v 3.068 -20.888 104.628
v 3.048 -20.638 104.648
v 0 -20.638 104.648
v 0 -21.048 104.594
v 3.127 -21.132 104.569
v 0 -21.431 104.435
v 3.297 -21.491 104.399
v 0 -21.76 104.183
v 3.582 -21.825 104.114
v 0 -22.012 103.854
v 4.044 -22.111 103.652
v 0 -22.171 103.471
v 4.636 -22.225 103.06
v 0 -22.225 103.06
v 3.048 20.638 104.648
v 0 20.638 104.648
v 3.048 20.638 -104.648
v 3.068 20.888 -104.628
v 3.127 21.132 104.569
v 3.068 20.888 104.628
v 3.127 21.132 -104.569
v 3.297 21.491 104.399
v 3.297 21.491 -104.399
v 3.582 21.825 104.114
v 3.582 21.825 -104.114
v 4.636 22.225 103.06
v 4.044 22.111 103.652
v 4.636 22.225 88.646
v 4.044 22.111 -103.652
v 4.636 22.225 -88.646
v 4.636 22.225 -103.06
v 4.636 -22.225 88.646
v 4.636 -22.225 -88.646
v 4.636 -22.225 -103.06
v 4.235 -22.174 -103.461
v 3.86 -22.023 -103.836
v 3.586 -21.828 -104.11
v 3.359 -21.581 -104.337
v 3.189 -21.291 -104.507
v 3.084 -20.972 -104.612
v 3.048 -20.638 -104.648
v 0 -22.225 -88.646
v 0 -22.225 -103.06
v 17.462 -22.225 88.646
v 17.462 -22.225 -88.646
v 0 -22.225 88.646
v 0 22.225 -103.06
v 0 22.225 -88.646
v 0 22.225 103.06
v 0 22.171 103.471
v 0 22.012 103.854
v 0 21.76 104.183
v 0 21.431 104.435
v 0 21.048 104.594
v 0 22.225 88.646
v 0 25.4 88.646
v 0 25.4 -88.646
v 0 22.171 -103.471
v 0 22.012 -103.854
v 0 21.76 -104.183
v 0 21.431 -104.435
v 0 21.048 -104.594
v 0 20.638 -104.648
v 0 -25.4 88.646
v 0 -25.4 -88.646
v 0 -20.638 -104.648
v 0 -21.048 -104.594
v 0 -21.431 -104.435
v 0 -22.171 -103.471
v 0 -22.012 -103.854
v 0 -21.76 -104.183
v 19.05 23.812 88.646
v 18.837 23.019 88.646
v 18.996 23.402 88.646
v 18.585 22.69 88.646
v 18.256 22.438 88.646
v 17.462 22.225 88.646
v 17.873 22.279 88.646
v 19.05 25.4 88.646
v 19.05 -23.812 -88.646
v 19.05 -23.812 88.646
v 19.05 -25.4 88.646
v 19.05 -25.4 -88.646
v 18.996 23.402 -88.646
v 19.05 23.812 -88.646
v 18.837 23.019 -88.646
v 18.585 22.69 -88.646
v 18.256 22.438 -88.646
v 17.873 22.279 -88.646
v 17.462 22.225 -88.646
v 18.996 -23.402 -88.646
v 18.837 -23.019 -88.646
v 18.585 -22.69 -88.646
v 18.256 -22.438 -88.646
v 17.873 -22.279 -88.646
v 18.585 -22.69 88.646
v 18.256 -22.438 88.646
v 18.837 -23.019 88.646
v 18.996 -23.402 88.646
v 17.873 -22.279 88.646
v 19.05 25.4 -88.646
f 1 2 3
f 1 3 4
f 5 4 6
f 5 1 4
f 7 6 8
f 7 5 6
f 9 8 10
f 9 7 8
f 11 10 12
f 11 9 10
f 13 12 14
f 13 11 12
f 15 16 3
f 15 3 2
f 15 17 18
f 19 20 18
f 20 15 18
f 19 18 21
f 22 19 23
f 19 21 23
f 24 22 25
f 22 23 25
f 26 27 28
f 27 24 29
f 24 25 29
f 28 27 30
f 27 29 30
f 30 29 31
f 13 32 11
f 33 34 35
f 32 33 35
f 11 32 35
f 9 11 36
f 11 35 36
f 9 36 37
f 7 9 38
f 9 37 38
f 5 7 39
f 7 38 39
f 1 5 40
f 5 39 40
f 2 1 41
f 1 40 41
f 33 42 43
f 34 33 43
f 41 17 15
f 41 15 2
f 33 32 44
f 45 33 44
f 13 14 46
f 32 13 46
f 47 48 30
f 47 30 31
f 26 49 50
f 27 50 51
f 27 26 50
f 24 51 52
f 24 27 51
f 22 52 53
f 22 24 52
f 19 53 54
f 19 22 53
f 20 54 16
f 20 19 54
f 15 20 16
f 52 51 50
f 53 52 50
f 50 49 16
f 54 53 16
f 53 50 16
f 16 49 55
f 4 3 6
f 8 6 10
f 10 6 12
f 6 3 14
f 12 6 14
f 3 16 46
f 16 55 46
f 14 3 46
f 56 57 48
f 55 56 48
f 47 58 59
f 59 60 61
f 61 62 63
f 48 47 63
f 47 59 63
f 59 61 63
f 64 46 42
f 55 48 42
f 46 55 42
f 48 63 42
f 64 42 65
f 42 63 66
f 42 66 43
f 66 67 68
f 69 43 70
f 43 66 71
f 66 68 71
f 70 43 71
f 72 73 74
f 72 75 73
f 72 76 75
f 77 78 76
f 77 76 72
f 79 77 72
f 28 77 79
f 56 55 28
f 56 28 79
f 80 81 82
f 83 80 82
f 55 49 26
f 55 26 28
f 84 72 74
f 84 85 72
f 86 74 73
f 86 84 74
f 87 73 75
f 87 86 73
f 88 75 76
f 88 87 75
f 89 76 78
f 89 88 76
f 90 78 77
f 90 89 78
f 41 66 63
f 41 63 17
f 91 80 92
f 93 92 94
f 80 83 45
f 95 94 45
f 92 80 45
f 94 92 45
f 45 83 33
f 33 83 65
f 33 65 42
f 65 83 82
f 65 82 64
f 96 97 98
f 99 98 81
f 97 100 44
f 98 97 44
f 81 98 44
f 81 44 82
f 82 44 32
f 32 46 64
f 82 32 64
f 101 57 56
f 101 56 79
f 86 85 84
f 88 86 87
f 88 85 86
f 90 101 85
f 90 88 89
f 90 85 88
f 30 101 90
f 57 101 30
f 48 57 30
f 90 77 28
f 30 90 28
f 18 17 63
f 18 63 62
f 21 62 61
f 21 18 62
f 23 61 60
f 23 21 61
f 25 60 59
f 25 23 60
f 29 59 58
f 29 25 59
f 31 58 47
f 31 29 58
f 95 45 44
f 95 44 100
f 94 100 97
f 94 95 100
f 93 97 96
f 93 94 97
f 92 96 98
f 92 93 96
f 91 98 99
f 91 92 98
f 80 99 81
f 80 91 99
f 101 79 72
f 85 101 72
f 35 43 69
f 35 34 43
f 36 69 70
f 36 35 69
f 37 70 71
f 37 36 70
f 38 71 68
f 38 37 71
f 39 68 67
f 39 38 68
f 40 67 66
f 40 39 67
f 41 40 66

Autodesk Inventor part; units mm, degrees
ref_plane "YZ Plane" through (0, 0, 0) normal (1, 0, 0) x (0, 1, 0)
ref_plane "XZ Plane" through (0, 0, 0) normal (0, 1, 0) x (-1, 0, 0)
ref_plane "XY Plane" through (0, 0, 0) normal (0, 0, 1) x (1, 0, 0)
sketch "Sketch3" plane through (0, 0, 0) normal (0, 0, 1) x (1, 0, 0)
  line L0 (0, 25.4) -> (0, -25.4)
  line L1 (0, 25.4) -> (19.05, 25.4)
  line L2 (19.05, 25.4) -> (19.05, 22.225)
  line L3 (19.05, 22.225) -> (3.048, 22.225)
  line L4 (3.048, 22.225) -> (3.048, -22.225)
  line L5 (3.048, -22.225) -> (19.05, -22.225)
  line L6 (19.05, -22.225) -> (19.05, -25.4)
  line L7 (19.05, -25.4) -> (0, -25.4)
  line L8 (0, 0) -> (3.048, 0) construction
  dimension "d7" = 50.8
  dimension "d19" = 16.002
  dimension "d20" = 19.05
  dimension "d21" = 3.175
extrude "Extrusion3" add sketch "Sketch3" along normal mid plane 209.296
fillet "Fillet1" radius 1.5875 4 edges at (19.05, 22.225, 0) (19.05, -22.225, 0) (3.048, -22.225, 0) (3.048, 22.225, 0)
sketch "Sketch4" plane through (0, -25.4, 104.648) normal (-1, 0, 0) x (0, 0, 1)
  line L0 (0, 50.8) -> (-209.296, 50.8) projected
  line L1 (-209.296, 50.8) -> (-193.294, 50.8)
  line L2 (-193.294, 50.8) -> (-193.294, 47.625)
  line L3 (-193.294, 47.625) -> (-209.296, 47.625)
  line L4 (-209.296, 47.625) -> (-209.296, 50.8)
  line L5 (0, 46.0375) -> (-209.296, 46.0375) projected
  line L6 (-209.296, 4.7625) -> (0, 4.7625) projected
  line L7 (-209.296, 0) -> (0, 0) projected
  line L8 (-209.296, 0) -> (0, 0) projected
  line L9 (-209.296, 0) -> (-193.294, 0)
  line L10 (-193.294, 0) -> (-193.294, 3.175)
  line L11 (-193.294, 3.175) -> (-209.296, 3.175)
  line L12 (-209.296, 3.175) -> (-209.296, 0)
  line L13 (0, 3.175) -> (-209.296, 3.175) projected
  line L14 (-209.296, 47.625) -> (0, 47.625) projected
  point P0 (-104.648, 25.4)
  dimension "d14" = 16.002
extrude "Extrusion4" cut sketch "Sketch4" against normal through all
mirror "Mirror1" about plane through (0, 0, 0) normal (0, 0, 1) of "Extrusion4"
fillet "Fillet3" radius 1.5875 4 edges at (2.3177, 22.225, -104.648) (2.3177, -22.225, -104.648) (2.3177, 22.225, 104.648) (2.3177, -22.225, 104.648)
equation "\"d11\" = Length"
equation "\"Length\" = 209.296"
properties part number "NASA-20-FR-FP-01" material "Aluminum 6061"
